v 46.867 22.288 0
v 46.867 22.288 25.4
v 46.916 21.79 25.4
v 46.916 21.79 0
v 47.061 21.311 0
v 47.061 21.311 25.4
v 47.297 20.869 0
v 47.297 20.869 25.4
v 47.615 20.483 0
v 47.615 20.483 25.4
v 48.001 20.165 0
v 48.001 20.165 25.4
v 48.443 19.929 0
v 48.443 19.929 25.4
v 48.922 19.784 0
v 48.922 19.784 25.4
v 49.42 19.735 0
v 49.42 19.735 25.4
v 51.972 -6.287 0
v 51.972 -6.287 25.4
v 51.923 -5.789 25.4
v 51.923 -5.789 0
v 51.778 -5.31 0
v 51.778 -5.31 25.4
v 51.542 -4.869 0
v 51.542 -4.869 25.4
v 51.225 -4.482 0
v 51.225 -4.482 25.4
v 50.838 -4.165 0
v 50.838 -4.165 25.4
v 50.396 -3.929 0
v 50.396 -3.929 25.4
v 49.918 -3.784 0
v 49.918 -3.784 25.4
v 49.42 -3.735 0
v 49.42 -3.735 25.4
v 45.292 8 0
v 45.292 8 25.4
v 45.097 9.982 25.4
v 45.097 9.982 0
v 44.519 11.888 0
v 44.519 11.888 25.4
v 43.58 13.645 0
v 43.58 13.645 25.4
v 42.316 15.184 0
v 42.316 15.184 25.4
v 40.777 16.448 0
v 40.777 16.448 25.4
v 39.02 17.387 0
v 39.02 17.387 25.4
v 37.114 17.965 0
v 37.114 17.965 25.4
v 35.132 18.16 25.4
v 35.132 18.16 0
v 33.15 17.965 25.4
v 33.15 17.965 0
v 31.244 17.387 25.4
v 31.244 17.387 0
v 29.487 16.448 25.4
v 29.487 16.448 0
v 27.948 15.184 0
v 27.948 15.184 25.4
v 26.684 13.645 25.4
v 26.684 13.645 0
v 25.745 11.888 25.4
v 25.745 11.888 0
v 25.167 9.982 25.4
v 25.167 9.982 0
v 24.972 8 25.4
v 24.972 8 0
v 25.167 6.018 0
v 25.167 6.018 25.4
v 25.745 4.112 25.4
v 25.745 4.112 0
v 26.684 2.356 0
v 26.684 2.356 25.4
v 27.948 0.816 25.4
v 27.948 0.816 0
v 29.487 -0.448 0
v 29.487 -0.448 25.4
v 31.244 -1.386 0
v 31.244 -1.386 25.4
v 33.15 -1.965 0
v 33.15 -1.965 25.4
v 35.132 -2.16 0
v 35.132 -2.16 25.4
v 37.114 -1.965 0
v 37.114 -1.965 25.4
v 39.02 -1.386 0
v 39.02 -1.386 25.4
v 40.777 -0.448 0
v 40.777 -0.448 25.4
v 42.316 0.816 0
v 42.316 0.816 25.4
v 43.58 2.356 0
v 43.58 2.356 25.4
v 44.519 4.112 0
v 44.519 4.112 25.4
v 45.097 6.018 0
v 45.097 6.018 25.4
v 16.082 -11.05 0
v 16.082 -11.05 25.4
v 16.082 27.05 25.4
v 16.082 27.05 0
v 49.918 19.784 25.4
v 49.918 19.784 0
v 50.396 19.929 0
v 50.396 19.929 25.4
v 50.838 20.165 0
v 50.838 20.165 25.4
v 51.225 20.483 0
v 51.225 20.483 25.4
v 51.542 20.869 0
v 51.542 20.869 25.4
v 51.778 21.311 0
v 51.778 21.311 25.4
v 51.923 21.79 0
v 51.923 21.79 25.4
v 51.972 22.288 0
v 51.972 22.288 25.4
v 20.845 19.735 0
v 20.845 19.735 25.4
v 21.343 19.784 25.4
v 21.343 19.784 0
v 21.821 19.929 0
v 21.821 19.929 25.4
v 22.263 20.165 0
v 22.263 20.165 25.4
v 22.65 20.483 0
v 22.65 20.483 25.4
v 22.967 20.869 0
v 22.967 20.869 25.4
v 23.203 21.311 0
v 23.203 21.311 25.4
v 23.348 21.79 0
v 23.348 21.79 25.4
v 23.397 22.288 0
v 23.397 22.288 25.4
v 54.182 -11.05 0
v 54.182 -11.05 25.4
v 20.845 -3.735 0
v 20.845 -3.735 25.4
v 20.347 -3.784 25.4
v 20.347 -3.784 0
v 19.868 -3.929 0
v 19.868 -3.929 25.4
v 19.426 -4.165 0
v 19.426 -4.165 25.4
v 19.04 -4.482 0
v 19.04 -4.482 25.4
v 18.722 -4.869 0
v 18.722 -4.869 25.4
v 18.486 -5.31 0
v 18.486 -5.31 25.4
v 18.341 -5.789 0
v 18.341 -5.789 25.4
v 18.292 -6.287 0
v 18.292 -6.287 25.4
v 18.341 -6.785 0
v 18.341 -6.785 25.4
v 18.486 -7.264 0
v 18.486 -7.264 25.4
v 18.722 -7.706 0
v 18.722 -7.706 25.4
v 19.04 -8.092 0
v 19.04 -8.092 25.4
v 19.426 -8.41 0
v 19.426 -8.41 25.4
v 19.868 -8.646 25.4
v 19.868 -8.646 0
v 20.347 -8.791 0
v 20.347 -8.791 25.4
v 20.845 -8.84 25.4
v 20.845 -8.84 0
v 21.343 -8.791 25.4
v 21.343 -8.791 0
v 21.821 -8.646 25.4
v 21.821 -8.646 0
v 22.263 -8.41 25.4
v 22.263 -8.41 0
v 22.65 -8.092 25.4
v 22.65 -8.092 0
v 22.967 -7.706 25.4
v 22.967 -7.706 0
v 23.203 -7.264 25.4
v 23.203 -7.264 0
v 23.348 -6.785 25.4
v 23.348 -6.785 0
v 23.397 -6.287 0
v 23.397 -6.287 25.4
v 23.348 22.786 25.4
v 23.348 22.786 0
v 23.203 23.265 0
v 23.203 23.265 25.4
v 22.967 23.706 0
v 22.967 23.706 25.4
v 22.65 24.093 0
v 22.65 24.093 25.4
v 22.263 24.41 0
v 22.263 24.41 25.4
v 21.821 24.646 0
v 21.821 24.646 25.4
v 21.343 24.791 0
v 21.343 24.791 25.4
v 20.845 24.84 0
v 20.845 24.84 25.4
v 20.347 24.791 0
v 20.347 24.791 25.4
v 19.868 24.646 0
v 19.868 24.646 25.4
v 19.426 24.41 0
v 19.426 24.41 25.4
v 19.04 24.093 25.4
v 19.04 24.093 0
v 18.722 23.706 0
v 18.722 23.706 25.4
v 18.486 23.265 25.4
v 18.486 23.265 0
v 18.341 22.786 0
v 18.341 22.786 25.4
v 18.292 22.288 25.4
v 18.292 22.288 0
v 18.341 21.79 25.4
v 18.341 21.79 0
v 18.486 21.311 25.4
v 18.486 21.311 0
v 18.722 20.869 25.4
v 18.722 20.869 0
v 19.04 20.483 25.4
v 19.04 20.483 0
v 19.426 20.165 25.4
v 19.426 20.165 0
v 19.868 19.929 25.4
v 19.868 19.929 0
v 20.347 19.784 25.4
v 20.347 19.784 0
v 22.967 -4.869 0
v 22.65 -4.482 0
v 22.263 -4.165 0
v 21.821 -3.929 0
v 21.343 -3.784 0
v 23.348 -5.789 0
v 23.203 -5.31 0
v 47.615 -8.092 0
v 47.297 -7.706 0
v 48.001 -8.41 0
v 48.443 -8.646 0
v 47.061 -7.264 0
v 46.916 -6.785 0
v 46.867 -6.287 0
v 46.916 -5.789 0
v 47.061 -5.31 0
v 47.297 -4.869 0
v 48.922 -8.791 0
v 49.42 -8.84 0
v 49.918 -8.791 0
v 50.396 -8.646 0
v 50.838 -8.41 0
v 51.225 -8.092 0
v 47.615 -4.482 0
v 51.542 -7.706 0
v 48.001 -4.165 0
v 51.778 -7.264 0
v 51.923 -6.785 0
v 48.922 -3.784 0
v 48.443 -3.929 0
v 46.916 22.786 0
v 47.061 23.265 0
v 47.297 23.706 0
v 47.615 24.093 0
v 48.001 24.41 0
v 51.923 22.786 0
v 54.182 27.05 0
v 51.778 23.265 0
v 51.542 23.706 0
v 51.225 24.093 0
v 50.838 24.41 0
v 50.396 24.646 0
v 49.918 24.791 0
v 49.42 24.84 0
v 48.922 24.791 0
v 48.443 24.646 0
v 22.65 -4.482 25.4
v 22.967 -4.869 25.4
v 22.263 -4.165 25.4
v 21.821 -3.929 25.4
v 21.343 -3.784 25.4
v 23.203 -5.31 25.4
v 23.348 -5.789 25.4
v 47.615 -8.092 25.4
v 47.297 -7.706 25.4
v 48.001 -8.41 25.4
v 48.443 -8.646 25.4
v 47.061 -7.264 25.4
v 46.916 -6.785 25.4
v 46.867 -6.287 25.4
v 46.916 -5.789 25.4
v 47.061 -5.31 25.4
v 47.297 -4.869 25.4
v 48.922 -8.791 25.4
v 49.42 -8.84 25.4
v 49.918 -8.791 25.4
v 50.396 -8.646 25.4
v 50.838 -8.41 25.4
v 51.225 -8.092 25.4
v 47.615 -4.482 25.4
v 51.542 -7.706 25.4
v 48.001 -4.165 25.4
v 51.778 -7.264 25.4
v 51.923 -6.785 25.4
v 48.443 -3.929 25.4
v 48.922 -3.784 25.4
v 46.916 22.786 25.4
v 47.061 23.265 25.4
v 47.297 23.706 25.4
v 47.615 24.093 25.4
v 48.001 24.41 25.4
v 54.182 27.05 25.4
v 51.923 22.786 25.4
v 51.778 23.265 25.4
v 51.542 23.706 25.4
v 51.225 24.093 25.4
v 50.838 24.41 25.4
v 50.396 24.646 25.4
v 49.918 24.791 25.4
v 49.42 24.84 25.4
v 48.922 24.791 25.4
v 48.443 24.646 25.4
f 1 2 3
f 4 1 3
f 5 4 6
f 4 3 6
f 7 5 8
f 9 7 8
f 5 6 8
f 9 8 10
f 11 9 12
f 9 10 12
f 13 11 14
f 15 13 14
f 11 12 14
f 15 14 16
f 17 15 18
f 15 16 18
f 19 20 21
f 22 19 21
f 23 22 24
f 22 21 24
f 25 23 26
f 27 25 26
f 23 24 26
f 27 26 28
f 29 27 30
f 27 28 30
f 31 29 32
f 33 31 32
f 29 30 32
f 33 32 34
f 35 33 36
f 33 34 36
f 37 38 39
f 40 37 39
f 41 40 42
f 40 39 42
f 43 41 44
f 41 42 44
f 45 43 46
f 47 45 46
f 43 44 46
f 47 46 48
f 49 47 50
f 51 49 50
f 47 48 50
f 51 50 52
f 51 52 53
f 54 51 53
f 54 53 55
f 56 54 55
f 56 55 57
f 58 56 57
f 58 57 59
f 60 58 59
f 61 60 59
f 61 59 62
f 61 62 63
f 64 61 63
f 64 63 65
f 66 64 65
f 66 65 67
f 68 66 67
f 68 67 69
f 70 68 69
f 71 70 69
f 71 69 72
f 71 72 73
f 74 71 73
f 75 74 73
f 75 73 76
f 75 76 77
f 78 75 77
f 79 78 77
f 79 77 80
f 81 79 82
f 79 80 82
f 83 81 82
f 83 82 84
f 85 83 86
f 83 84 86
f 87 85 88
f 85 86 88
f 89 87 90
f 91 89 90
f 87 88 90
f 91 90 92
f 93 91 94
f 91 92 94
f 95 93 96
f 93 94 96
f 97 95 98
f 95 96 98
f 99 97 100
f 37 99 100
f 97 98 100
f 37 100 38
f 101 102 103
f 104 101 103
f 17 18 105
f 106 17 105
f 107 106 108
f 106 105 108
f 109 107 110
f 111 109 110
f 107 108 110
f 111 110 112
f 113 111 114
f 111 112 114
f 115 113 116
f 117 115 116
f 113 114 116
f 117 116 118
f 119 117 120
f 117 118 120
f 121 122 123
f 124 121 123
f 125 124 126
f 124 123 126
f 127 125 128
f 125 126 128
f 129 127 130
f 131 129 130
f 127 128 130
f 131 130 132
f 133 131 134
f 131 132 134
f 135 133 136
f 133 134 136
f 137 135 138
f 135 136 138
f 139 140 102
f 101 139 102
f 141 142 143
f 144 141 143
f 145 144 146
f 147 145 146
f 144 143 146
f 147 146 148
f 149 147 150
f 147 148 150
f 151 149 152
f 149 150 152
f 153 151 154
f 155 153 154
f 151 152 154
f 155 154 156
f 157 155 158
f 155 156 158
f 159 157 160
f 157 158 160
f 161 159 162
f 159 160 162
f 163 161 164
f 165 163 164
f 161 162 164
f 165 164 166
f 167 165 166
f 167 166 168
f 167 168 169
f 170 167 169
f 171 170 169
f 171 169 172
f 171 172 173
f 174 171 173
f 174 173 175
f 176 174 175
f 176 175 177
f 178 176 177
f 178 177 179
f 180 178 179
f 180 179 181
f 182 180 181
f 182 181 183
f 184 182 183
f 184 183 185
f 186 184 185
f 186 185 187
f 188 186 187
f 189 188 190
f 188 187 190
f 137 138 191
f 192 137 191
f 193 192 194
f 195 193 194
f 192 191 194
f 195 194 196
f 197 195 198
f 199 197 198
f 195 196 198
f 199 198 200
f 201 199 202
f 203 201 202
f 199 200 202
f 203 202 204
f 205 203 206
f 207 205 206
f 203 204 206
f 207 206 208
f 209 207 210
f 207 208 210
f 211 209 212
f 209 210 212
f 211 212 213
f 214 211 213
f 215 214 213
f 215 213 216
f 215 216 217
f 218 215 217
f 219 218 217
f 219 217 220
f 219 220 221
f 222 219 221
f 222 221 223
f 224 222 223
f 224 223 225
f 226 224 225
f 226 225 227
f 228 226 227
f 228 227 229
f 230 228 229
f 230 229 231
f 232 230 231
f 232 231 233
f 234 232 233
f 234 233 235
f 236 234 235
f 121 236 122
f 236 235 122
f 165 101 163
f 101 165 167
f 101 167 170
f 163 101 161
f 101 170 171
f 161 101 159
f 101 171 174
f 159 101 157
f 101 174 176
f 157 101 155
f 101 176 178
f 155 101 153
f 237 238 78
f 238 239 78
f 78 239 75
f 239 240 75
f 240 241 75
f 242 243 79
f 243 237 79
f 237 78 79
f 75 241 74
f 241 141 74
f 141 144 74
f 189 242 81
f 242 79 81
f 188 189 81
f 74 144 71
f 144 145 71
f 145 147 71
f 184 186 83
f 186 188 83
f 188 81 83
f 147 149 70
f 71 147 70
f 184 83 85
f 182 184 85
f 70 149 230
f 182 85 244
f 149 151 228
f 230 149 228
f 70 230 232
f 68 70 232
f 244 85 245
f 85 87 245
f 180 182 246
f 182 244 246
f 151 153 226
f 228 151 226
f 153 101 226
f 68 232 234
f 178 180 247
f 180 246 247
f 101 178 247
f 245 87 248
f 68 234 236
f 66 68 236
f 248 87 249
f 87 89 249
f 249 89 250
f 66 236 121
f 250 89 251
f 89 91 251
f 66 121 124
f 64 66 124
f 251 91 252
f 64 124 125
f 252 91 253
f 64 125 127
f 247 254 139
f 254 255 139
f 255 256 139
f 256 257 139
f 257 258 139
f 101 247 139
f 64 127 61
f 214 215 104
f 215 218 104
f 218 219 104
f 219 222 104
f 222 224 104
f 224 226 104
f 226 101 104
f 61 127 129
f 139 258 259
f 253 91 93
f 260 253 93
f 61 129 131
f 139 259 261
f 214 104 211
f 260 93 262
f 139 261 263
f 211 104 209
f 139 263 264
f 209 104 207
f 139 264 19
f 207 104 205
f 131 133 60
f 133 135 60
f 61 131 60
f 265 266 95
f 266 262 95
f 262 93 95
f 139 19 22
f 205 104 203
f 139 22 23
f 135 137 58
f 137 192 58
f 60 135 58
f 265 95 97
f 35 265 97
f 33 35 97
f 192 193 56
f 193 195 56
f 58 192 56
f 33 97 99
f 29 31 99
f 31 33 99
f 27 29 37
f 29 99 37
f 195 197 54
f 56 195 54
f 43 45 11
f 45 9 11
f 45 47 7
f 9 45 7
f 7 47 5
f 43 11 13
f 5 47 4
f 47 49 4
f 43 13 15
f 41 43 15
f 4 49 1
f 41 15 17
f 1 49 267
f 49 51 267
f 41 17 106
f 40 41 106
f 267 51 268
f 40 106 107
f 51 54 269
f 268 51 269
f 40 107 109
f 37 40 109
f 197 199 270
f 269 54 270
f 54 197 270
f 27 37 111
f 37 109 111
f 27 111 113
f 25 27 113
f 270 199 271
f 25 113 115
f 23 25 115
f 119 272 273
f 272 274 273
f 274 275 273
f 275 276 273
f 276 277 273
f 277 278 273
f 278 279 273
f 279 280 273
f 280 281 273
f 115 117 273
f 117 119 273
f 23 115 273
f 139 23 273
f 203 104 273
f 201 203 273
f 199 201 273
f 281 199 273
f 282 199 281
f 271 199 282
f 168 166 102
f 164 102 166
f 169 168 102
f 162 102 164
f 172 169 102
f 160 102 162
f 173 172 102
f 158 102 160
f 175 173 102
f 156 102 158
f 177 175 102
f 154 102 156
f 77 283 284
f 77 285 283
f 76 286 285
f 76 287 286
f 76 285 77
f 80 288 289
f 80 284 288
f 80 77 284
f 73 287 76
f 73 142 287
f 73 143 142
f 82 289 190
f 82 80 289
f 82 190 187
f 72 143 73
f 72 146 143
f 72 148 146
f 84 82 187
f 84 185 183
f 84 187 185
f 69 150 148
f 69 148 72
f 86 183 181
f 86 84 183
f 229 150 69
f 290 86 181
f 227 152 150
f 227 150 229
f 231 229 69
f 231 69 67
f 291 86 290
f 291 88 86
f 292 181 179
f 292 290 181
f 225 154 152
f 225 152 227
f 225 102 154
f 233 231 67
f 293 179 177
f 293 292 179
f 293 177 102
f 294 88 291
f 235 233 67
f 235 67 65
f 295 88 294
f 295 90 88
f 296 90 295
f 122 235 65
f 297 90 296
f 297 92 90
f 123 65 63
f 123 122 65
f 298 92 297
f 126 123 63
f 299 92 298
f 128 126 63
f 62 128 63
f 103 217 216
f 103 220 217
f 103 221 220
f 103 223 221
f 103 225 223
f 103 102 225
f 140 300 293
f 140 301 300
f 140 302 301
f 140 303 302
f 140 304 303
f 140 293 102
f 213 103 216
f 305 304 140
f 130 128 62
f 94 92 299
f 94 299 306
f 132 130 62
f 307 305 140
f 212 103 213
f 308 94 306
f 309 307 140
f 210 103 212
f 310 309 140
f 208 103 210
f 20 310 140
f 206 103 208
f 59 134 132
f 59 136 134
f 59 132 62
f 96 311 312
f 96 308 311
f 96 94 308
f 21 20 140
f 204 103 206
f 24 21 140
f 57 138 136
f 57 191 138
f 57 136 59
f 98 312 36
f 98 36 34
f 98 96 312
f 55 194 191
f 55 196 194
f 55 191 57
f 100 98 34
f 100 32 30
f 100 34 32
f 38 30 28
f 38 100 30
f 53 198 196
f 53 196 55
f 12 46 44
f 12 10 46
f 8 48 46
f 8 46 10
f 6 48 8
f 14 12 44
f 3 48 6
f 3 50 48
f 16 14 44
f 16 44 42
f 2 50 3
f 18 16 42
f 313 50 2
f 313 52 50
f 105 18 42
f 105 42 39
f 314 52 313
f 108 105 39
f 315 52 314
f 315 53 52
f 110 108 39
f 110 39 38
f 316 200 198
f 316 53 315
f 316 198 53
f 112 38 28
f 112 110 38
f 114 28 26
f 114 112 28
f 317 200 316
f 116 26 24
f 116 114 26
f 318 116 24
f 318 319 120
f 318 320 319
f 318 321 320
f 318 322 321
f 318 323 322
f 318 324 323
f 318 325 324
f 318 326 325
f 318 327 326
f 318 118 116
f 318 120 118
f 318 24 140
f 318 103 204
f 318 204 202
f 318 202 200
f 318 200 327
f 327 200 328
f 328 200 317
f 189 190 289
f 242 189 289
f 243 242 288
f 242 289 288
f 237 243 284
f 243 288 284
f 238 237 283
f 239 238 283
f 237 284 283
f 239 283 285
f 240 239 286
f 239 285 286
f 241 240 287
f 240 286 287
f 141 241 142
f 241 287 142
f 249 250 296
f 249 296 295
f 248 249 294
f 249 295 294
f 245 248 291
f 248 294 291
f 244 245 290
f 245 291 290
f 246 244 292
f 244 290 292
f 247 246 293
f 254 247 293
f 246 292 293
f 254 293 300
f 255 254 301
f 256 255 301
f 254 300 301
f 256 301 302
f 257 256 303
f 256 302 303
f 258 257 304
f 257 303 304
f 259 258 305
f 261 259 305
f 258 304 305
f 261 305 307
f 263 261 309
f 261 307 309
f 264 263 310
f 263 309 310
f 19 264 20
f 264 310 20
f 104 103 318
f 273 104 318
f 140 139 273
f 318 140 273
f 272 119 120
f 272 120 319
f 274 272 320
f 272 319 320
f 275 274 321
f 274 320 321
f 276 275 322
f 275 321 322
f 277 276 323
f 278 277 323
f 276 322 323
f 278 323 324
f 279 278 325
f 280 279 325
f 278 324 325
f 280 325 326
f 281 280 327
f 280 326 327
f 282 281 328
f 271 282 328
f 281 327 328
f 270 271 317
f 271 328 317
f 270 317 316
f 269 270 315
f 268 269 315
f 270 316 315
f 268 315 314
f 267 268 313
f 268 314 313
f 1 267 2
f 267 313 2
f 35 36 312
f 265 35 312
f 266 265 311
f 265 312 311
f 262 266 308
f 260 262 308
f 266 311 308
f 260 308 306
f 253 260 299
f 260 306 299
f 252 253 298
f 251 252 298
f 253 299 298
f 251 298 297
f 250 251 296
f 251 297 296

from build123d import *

# Parameters (mm, degrees)
F0_W     = 25.4
F0_H     = 14.2875
F1_DEPTH = 25.4
F2_R     = 10.16
F3_DEPTH = 25.401
F5_DEPTH = 25.401


# Not quite as in the source:
# - a feature names something its author has since deleted; it is built from what else it names


with BuildPart() as f1:
    # F0 (on Top) → F1 (new body)
    with BuildSketch(Plane.XY):
        with Locations((-34.7179355979, 53.2439169049)):
            Rectangle(F0_W, F0_H)
        Polygon((-22.0179355979, 46.1001669049), (-47.4179355979, 46.1001669049), (-47.4179355979, -30.0998330951), (-22.0179355979, -30.0998330951), (54.1820644021, -30.0998330951), (54.1820644021, 46.1001669049), align=None)
        with Locations((-34.7179355979, -37.2435830951)):
            Rectangle(F0_W, F0_H)
    extrude(amount=F1_DEPTH)

    # F2 (on face) → F3 (cut, through all)
    with BuildSketch(Plane.XY.offset(25.4)):
        with Locations((35.1320644021, 8.0001669049)):
            Circle(F2_R)
        with BuildLine():
            Line((23.3972644021, 22.2876669049), (20.8445644021, 22.2876669049))
            Line((20.8445644021, 22.2876669049), (20.8445644021, 19.7349669049))
            ThreePointArc((20.8445644021, 19.7349669049), (22.6495958824, 20.4826354246), (23.3972644021, 22.2876669049))
        make_face()
        with BuildLine():
            Line((20.8445644021, 19.7349669049), (20.8445644021, 22.2876669049))
            Line((20.8445644021, 22.2876669049), (23.3972644021, 22.2876669049))
            ThreePointArc((23.3972644021, 22.2876669049), (19.0395329218, 24.0926983853), (20.8445644021, 19.7349669049))
        make_face()
        with BuildLine():
            ThreePointArc((51.9722644021, 22.2876669049), (49.4195644021, 24.8403669049), (46.8668644021, 22.2876669049))
            Line((46.8668644021, 22.2876669049), (49.4195644021, 22.2876669049))
            Line((49.4195644021, 22.2876669049), (49.4195644021, 19.7349669049))
            ThreePointArc((49.4195644021, 19.7349669049), (51.2245958824, 20.4826354246), (51.9722644021, 22.2876669049))
        make_face()
        with BuildLine():
            Line((49.4195644021, 22.2876669049), (46.8668644021, 22.2876669049))
            ThreePointArc((46.8668644021, 22.2876669049), (47.6145329218, 20.4826354246), (49.4195644021, 19.7349669049))
            Line((49.4195644021, 19.7349669049), (49.4195644021, 22.2876669049))
        make_face()
        with BuildLine():
            Line((49.4195644021, -6.2873330951), (49.4195644021, -3.7346330951))
            ThreePointArc((49.4195644021, -3.7346330951), (47.6145329218, -4.4823016147), (46.8668644021, -6.2873330951))
            Line((46.8668644021, -6.2873330951), (49.4195644021, -6.2873330951))
        make_face()
        with BuildLine():
            ThreePointArc((51.9722644021, -6.2873330951), (51.2245958824, -4.4823016147), (49.4195644021, -3.7346330951))
            Line((49.4195644021, -3.7346330951), (49.4195644021, -6.2873330951))
            Line((49.4195644021, -6.2873330951), (46.8668644021, -6.2873330951))
            ThreePointArc((46.8668644021, -6.2873330951), (49.4195644021, -8.8400330951), (51.9722644021, -6.2873330951))
        make_face()
        with BuildLine():
            ThreePointArc((23.3972644021, -6.2873330951), (22.6495958824, -4.4823016147), (20.8445644021, -3.7346330951))
            Line((20.8445644021, -3.7346330951), (20.8445644021, -6.2873330951))
            Line((20.8445644021, -6.2873330951), (23.3972644021, -6.2873330951))
        make_face()
        with BuildLine():
            Line((20.8445644021, -6.2873330951), (20.8445644021, -3.7346330951))
            ThreePointArc((20.8445644021, -3.7346330951), (19.0395329218, -8.0923645754), (23.3972644021, -6.2873330951))
            Line((23.3972644021, -6.2873330951), (20.8445644021, -6.2873330951))
        make_face()
    extrude(amount=-F3_DEPTH, mode=Mode.SUBTRACT)

    # F4 (on face) → F5 (cut, through all)
    with BuildSketch(Plane.XY.offset(25.4)):
        Polygon((54.1820644021, -30.0998330951), (54.1820644021, -11.0498330951), (16.0820644021, -11.0498330951), (16.0820644021, 27.0501669049), (54.1820644021, 27.0501669049), (54.1820644021, 46.1001669049), (-22.0179355979, 46.1001669049), (-22.0179355979, 60.3876669049), (-47.4179355979, 60.3876669049), (-47.4179355979, -44.3873330951), (-22.0179355979, -44.3873330951), (-22.0179355979, -30.0998330951), align=None)
    extrude(amount=-F5_DEPTH, mode=Mode.SUBTRACT)


solid = f1.part
